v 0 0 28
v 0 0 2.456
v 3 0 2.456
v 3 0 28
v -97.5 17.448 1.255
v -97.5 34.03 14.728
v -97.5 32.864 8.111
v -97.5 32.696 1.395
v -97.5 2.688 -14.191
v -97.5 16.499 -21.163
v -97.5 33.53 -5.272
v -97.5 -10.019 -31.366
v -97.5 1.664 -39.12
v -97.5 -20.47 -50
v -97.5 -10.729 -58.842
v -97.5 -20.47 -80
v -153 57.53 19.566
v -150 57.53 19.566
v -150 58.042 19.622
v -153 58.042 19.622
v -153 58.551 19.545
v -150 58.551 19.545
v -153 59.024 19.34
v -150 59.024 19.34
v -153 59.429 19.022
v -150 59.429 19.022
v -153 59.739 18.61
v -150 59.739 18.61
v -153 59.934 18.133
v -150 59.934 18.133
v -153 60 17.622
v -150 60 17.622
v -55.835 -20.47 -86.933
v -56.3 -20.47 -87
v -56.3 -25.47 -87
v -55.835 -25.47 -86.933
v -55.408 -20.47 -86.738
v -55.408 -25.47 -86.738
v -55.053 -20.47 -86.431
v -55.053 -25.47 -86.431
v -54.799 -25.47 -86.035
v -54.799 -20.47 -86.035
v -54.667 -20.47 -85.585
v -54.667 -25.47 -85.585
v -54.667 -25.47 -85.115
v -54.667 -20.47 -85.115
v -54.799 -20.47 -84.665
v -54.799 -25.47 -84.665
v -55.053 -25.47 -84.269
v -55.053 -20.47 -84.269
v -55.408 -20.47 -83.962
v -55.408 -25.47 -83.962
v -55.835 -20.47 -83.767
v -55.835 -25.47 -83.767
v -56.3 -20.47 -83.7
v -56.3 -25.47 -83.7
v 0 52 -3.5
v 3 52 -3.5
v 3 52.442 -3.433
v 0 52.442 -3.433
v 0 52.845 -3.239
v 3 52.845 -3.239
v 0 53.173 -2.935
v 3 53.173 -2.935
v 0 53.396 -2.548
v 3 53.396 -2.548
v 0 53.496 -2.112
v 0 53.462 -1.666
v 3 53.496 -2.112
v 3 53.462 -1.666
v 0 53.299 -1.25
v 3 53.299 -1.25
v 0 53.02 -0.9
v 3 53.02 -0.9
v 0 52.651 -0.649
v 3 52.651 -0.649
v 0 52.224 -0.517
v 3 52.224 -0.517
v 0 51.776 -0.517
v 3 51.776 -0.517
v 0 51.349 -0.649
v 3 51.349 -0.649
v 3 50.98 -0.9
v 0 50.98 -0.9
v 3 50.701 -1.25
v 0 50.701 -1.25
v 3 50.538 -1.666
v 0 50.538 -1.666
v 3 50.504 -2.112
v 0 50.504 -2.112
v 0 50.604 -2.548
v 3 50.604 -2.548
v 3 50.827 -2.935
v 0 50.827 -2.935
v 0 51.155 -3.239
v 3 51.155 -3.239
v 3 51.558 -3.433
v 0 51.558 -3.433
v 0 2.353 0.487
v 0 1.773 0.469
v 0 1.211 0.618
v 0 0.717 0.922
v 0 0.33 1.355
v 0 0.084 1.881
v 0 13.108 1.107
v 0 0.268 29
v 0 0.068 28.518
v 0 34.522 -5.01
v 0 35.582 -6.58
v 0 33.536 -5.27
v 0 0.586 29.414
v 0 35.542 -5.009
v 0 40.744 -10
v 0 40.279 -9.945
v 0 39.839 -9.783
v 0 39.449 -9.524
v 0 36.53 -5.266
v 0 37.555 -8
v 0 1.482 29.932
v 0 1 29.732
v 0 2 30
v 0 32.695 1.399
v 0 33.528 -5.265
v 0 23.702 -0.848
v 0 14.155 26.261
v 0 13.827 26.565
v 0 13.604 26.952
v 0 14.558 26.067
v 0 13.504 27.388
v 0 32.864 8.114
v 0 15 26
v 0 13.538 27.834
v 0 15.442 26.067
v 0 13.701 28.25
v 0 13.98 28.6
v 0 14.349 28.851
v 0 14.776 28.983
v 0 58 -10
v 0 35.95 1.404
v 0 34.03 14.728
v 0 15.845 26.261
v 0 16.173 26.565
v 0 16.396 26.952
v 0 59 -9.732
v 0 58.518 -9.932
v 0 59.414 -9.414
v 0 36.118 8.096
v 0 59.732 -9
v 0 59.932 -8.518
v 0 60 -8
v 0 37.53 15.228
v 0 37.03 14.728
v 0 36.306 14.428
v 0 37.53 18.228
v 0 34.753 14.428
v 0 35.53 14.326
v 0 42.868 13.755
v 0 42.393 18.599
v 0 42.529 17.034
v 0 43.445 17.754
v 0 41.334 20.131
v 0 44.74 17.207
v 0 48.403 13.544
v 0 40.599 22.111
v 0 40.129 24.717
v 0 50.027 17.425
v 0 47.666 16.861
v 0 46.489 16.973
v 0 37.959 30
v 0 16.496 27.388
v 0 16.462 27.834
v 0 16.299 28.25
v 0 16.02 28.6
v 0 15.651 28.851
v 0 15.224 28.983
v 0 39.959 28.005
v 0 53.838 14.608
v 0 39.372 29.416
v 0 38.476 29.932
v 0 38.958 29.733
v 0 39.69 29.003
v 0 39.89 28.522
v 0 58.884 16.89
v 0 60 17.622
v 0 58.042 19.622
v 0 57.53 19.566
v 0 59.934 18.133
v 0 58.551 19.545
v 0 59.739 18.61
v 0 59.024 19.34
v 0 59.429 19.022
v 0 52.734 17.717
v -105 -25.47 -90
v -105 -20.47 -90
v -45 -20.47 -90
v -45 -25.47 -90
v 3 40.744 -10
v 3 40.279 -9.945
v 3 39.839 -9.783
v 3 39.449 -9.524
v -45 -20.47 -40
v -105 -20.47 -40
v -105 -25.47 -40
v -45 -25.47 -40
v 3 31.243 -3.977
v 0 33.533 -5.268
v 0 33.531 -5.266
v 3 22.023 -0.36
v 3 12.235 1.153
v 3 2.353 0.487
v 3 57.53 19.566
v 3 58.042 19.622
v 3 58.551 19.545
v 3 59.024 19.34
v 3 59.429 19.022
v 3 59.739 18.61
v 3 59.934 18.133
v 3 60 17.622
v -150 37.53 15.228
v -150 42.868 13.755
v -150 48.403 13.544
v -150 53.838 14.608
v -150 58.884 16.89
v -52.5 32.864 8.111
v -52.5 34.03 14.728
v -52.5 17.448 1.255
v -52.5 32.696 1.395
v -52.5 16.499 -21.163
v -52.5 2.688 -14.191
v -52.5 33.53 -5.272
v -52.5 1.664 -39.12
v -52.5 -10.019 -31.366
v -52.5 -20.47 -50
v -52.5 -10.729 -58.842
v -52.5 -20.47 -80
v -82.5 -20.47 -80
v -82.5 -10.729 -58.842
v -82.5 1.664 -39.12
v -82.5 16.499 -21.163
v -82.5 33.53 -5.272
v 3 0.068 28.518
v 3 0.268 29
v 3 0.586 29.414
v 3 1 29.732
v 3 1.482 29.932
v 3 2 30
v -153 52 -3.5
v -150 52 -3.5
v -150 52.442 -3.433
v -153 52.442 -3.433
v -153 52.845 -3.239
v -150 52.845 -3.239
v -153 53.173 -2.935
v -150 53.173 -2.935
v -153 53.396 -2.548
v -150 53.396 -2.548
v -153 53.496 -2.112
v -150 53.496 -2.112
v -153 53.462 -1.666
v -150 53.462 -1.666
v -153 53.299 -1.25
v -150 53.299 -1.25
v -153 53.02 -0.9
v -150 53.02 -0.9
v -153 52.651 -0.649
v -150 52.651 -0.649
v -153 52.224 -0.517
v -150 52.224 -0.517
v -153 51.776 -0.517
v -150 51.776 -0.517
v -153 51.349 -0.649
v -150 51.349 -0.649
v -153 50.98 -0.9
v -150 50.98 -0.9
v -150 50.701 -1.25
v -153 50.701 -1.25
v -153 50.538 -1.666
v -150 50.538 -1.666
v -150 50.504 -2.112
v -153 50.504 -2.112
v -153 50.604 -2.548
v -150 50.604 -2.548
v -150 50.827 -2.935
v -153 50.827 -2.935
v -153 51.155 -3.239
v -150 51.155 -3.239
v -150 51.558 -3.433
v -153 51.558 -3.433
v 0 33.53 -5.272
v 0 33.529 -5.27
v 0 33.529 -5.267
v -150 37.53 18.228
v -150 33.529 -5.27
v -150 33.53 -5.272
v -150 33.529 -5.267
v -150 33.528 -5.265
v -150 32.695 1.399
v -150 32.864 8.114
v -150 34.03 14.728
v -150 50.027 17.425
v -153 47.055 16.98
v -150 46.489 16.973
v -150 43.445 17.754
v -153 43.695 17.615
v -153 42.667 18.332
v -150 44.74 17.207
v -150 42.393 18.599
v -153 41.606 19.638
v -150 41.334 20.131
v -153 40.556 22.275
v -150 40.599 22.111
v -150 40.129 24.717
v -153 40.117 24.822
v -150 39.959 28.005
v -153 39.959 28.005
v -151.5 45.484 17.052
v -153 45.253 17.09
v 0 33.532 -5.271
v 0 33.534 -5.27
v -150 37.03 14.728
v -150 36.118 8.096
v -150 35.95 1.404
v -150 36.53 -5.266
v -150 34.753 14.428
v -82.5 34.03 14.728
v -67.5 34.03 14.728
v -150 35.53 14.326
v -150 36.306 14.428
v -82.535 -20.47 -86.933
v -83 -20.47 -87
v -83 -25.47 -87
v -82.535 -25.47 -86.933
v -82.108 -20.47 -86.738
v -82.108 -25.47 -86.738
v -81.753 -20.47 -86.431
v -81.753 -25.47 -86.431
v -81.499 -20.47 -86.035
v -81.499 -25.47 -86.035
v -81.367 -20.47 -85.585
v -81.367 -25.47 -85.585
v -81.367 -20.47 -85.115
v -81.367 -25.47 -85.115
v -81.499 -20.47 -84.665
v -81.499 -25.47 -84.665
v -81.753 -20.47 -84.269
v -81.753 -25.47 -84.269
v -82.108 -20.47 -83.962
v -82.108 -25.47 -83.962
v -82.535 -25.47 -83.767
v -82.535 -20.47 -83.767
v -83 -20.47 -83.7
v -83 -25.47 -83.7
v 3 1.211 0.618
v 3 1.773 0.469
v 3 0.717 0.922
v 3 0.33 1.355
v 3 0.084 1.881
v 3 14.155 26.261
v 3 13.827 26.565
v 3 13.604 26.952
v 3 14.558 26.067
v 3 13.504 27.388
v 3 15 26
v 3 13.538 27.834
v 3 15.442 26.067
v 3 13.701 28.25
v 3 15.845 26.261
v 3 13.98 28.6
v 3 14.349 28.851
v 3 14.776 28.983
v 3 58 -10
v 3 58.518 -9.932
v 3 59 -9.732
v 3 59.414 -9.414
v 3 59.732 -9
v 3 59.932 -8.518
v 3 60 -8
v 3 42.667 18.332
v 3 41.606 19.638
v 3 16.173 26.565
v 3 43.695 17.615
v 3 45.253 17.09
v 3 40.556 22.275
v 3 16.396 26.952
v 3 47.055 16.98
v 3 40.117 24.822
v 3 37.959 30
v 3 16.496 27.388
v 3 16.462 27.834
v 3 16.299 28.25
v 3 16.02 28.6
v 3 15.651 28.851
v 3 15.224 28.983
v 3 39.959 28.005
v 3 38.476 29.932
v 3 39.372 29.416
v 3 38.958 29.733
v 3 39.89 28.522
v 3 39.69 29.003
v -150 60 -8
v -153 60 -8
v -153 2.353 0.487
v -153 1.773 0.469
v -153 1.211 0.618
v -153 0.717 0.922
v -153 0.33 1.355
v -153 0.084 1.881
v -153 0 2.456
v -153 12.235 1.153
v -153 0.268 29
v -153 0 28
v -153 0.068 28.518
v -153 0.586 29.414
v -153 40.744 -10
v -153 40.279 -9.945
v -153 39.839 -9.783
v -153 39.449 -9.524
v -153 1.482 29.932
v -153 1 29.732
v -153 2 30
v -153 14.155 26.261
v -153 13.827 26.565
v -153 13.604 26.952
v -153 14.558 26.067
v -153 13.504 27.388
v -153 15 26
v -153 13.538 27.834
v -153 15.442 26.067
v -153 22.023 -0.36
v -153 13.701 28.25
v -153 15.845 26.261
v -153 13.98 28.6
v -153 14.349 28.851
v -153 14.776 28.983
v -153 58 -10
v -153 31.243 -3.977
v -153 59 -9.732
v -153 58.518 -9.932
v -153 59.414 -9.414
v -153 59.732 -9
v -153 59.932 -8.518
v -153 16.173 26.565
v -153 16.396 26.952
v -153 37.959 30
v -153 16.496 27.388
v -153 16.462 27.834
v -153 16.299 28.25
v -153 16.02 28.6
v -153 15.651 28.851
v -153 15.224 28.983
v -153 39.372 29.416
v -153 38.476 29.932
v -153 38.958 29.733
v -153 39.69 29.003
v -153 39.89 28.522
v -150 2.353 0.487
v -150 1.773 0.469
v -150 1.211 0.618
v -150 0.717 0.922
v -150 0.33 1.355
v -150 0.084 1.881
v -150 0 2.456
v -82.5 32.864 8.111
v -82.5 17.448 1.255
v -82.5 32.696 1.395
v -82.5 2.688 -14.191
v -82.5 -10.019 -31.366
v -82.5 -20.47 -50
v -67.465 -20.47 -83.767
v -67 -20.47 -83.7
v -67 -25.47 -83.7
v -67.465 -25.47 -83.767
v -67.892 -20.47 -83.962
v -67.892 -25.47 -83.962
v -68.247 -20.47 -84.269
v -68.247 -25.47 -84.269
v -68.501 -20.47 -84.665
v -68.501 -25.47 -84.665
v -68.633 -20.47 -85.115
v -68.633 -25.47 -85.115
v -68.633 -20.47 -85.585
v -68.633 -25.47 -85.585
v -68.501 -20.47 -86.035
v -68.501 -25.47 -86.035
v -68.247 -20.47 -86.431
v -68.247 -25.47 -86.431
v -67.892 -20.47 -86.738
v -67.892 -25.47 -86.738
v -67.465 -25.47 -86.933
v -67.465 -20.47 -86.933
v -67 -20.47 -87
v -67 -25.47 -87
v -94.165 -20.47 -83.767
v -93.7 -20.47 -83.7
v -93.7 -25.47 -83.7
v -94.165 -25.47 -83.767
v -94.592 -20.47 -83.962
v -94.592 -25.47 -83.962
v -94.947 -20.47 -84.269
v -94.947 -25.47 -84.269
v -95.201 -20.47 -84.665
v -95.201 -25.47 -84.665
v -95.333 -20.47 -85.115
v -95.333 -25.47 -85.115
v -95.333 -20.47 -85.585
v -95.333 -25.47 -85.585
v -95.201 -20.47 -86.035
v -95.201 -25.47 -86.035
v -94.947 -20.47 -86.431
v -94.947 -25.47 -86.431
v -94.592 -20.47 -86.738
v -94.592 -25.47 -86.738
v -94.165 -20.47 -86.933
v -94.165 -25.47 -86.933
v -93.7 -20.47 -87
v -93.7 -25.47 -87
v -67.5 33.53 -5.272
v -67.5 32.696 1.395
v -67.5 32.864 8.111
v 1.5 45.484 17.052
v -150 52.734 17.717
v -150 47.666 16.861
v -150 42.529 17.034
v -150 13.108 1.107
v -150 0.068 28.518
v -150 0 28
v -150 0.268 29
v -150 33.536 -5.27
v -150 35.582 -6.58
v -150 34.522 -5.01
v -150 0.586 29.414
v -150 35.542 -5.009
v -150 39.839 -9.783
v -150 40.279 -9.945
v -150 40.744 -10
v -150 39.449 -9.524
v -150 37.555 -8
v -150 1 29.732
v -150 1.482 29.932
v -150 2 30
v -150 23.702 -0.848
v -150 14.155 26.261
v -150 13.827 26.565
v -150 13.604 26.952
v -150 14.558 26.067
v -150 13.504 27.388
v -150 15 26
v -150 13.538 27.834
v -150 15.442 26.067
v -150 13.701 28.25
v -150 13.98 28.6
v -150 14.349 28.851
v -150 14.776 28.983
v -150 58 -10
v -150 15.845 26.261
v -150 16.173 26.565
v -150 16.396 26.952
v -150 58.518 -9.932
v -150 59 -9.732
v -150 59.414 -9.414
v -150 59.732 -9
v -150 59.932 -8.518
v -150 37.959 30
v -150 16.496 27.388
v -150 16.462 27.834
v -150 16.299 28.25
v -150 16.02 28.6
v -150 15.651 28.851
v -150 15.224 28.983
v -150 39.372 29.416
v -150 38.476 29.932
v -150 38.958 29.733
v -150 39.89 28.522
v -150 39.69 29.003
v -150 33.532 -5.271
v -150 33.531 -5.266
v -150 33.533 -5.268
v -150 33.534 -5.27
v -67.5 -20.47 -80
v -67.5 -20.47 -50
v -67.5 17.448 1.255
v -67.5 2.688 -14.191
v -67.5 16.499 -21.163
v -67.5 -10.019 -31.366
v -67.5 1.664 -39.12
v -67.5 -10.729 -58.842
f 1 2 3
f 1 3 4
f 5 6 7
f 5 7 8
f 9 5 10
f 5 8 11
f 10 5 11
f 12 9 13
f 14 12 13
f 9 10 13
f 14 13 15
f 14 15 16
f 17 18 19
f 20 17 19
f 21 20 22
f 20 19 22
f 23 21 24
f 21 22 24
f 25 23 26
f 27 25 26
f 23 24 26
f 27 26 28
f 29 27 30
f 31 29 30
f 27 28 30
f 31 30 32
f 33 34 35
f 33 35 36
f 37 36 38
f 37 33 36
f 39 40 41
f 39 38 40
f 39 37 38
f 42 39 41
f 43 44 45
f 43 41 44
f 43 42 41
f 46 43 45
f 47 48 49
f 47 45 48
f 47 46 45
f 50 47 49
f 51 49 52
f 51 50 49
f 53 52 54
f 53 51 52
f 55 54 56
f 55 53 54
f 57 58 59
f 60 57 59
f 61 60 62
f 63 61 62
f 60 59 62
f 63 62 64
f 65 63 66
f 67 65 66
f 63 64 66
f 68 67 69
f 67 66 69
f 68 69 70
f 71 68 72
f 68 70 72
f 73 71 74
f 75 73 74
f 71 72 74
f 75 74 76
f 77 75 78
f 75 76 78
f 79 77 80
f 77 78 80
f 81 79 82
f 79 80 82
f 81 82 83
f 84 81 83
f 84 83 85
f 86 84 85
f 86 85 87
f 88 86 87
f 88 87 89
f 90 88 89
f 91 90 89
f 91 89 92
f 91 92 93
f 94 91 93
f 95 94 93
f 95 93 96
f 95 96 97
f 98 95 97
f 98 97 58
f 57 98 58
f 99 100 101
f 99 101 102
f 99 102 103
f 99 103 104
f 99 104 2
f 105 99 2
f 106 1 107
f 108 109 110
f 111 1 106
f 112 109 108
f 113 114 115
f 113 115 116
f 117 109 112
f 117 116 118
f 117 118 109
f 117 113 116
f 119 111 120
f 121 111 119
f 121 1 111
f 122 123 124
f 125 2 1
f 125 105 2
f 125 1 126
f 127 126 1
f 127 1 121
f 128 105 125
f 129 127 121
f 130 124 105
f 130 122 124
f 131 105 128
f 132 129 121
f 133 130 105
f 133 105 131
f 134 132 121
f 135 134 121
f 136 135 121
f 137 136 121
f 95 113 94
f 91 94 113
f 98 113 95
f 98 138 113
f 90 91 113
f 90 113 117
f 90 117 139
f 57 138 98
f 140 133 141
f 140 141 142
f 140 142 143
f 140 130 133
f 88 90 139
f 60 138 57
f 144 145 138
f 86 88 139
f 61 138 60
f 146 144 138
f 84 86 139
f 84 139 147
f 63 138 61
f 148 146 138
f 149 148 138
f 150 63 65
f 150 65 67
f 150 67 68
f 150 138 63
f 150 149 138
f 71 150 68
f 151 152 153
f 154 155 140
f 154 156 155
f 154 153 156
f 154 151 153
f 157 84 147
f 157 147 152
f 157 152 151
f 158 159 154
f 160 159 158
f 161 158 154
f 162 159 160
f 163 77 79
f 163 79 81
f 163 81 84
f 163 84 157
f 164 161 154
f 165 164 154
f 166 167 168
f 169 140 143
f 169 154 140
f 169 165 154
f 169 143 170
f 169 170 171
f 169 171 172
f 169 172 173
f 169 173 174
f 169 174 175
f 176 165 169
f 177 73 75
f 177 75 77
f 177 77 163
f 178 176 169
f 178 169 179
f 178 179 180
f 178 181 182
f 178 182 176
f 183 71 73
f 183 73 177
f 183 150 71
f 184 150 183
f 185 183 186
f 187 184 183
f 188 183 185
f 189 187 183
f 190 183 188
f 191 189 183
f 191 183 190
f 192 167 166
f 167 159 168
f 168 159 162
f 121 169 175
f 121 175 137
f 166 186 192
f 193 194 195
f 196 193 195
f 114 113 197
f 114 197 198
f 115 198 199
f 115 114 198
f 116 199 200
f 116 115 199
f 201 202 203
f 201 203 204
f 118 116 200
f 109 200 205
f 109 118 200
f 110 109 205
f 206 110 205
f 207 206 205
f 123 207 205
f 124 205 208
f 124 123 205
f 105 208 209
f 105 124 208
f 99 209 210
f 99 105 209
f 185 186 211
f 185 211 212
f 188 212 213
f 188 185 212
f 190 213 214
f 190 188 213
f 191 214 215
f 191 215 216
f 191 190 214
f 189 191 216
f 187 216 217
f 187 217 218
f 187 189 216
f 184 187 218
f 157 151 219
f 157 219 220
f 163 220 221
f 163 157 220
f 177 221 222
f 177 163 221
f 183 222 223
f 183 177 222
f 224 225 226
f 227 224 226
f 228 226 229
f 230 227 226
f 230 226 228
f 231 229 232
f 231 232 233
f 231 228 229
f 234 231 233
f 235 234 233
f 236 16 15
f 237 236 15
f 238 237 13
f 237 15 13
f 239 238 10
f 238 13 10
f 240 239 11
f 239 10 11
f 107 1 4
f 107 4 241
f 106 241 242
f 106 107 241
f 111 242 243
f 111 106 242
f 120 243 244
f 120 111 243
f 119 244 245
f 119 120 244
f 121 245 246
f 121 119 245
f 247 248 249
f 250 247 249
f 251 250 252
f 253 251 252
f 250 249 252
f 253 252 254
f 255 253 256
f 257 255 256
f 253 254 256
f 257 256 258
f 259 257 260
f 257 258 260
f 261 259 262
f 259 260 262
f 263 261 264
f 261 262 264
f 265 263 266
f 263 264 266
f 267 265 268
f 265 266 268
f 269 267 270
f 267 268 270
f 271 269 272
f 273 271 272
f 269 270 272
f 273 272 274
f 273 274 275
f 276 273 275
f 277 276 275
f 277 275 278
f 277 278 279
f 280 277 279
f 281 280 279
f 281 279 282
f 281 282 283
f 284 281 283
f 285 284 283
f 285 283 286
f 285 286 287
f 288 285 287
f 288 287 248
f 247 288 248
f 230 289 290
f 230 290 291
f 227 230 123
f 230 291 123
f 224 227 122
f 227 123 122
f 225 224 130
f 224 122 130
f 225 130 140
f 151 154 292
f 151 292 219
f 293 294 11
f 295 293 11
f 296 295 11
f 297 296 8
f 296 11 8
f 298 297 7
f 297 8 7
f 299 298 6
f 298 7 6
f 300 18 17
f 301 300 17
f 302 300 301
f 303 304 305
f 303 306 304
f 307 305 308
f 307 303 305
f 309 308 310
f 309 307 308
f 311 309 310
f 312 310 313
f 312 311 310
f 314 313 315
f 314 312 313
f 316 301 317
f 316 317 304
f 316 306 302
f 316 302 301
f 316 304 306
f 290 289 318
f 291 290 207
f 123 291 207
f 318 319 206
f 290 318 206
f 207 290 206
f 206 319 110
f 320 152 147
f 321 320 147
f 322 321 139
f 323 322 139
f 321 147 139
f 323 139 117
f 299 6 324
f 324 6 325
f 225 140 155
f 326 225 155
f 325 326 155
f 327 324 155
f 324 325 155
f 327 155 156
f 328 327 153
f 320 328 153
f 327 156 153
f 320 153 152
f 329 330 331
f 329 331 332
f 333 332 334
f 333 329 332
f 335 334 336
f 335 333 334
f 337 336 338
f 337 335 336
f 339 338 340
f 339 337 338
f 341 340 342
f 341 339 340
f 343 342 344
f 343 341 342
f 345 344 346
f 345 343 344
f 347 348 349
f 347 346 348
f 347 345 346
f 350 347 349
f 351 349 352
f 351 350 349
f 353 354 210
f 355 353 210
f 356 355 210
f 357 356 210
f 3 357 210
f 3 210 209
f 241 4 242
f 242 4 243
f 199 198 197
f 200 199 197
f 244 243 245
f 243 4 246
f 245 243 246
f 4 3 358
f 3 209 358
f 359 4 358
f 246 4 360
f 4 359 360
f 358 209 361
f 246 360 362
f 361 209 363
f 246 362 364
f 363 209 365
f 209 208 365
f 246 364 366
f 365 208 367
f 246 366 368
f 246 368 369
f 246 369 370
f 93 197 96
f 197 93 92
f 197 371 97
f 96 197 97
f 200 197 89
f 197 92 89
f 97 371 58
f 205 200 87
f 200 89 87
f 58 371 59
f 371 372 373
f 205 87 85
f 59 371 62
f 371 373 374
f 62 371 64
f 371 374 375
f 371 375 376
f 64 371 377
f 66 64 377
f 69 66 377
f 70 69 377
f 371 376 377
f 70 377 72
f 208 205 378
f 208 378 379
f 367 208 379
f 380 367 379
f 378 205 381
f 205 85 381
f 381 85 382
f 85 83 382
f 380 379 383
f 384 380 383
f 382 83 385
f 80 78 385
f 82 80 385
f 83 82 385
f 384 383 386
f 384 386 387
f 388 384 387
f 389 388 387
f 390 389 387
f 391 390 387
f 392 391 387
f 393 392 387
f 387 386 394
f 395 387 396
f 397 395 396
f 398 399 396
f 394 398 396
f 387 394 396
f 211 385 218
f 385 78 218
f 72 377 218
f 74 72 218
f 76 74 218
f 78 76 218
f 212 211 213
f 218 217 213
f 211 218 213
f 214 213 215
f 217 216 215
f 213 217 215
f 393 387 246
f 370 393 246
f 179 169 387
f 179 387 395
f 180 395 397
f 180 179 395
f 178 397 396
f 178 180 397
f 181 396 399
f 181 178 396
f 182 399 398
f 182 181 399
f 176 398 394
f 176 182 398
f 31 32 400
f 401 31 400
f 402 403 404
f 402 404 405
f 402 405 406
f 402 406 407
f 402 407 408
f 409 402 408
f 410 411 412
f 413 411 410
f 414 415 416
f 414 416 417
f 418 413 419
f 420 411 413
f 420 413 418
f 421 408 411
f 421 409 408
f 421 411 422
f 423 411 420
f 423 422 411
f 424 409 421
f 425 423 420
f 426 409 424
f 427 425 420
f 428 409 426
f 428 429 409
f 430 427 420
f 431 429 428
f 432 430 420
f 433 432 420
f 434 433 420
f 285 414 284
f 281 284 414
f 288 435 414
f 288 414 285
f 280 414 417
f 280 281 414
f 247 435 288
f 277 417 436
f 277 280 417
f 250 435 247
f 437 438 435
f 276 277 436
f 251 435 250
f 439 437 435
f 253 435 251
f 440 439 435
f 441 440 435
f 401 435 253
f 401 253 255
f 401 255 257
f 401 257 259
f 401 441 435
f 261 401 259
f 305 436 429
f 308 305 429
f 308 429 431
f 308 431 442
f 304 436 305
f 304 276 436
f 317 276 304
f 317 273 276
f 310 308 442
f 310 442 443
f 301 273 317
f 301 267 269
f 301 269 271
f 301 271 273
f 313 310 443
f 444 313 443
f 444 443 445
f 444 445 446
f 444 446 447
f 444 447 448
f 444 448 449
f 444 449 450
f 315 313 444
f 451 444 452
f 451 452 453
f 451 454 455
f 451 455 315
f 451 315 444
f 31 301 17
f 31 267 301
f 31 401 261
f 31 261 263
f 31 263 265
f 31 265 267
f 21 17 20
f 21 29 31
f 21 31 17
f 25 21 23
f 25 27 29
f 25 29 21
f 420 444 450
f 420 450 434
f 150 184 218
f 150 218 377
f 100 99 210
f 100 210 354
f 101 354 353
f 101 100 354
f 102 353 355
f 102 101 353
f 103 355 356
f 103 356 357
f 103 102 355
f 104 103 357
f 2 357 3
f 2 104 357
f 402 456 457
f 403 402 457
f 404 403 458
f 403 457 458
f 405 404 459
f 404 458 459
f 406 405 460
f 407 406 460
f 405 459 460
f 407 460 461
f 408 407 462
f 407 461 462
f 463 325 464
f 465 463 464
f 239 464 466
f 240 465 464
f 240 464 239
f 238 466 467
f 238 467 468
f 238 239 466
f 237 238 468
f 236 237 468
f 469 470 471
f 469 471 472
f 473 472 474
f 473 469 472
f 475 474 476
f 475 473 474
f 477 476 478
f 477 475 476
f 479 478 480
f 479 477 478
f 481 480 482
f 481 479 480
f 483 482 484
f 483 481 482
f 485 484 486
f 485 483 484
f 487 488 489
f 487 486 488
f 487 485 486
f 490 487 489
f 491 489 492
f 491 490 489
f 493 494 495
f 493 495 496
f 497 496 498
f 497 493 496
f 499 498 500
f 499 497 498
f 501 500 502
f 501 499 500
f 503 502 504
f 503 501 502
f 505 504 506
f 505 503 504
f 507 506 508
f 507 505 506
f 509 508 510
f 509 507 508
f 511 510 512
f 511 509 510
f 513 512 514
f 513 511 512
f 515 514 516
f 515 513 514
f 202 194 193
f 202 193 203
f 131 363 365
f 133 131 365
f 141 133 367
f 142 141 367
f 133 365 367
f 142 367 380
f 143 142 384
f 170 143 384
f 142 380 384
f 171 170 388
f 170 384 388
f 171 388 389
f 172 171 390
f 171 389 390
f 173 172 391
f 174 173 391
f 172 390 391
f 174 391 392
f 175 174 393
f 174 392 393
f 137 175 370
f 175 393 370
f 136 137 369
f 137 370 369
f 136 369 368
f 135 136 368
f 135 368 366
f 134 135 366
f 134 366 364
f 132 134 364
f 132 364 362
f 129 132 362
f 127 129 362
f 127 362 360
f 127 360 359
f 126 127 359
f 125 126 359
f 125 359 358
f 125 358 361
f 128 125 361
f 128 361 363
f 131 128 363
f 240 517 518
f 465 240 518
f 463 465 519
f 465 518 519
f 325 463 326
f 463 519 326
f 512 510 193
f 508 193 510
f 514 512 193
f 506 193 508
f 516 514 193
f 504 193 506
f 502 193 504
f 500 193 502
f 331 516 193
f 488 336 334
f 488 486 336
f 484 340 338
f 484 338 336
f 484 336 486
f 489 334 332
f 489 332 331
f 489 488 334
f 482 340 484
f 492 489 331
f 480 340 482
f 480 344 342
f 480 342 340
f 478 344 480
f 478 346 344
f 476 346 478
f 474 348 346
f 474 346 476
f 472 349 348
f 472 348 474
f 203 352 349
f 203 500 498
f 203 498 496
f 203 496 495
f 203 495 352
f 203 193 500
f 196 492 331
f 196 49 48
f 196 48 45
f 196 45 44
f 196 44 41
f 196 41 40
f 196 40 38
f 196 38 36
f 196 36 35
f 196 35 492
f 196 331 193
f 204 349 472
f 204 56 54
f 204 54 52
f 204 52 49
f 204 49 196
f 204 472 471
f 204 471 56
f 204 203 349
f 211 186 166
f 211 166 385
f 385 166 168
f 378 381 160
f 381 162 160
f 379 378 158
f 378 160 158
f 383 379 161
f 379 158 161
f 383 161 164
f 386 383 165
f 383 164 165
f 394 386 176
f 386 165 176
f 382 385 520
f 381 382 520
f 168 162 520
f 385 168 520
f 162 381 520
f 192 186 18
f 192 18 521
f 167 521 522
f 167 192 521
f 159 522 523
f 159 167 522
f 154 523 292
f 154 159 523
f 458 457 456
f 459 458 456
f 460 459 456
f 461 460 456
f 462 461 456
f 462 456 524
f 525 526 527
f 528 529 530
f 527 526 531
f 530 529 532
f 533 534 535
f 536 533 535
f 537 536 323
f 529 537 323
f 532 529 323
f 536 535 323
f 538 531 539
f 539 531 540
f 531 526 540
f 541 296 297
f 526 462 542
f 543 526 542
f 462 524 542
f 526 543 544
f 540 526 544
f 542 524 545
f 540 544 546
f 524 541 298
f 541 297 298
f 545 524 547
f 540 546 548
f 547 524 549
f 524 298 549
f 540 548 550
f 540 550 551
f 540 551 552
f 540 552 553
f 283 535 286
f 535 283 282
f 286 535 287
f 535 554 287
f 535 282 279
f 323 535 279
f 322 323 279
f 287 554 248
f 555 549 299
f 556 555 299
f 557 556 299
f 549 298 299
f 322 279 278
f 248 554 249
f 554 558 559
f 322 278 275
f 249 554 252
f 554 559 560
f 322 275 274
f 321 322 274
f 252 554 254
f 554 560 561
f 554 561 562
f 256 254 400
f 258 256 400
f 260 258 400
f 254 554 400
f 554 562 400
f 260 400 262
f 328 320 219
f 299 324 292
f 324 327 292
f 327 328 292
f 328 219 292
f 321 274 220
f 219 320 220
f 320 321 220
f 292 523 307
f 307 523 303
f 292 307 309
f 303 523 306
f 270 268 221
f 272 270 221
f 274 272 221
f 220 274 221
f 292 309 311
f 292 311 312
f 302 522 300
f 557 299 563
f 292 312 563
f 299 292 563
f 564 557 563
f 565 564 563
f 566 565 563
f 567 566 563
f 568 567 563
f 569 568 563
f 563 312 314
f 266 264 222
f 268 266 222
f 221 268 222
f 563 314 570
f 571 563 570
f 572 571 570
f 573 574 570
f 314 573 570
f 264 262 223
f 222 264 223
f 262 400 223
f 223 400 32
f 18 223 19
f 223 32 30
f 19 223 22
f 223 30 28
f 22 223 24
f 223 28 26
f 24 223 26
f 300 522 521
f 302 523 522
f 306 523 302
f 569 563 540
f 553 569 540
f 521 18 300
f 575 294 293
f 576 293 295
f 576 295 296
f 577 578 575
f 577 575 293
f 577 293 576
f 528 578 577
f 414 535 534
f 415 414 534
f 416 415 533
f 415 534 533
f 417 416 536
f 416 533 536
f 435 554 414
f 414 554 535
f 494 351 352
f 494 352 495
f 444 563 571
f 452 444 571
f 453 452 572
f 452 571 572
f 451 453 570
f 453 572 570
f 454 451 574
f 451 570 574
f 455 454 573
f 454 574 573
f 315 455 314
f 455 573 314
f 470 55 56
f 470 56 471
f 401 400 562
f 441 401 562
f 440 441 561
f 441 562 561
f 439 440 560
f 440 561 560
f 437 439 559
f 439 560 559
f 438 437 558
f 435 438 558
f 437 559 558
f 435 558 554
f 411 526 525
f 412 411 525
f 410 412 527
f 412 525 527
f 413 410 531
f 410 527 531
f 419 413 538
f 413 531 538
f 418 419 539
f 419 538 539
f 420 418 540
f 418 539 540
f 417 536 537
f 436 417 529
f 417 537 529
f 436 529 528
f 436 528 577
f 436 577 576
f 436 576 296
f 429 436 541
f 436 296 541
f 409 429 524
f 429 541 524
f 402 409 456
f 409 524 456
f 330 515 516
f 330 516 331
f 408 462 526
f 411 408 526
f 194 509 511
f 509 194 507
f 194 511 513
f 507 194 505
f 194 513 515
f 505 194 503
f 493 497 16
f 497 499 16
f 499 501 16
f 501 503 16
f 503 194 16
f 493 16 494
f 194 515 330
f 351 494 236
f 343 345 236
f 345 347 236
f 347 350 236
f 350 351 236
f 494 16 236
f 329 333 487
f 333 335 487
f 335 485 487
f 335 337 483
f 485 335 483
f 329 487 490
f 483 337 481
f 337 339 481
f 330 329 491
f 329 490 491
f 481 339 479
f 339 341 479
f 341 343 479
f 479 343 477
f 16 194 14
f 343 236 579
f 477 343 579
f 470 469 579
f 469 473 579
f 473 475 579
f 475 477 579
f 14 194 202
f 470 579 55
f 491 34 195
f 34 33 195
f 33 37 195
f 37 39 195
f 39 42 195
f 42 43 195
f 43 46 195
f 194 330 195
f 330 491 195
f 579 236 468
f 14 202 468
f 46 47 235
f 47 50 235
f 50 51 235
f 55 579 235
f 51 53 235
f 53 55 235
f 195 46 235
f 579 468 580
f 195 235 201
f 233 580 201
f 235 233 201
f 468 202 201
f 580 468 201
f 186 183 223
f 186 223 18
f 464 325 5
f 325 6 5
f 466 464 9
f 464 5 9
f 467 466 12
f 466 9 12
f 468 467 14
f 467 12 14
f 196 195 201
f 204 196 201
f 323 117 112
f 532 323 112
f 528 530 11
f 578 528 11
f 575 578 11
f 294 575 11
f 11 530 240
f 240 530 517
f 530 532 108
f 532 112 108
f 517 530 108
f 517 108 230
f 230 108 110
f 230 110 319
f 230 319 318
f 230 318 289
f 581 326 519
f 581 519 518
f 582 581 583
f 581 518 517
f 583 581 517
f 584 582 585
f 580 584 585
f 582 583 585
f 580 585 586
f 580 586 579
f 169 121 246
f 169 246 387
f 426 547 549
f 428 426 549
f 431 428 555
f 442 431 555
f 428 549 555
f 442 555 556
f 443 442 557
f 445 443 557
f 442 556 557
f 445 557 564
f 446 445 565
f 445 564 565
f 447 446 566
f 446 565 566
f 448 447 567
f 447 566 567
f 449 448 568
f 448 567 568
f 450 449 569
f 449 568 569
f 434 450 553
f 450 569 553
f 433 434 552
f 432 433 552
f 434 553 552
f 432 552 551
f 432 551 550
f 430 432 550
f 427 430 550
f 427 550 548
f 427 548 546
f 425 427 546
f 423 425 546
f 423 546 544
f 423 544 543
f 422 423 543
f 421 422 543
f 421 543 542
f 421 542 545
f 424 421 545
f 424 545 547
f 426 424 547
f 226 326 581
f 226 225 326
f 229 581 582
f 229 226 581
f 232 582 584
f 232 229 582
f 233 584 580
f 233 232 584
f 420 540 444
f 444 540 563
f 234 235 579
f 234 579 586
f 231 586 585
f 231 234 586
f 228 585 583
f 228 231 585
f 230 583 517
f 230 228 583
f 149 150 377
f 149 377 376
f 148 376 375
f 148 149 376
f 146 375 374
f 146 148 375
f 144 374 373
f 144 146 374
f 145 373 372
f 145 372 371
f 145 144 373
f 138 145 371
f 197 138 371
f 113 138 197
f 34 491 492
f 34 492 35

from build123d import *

# Parameters (mm, degrees)
BOSS_EXTRUDE3_DEPTH  = 3
BOSS_EXTRUDE4_DEPTH  = 150
BOSS_EXTRUDE7_DEPTH  = 150
BOSS_EXTRUDE11_DEPTH = 7.5
SKETCH10_W           = 60
SKETCH10_H           = 50
BOSS_EXTRUDE12_DEPTH = 5
CUT_EXTRUDE1_DEPTH   = 195.89610275
SKETCH12_R           = 1.5
CUT_EXTRUDE2_DEPTH   = 190.831504348


with BuildPart() as part:
    # Sketch2 → Boss-Extrude3 (new body)
    with BuildSketch(Plane(origin=(0, 0, 0), x_dir=(0, 0, -1), z_dir=(1, 0, 0))):
        with BuildLine():
            Line((-2.455878577, 0), (-28, 0))
            ThreePointArc((-28, 0), (-29.414213562, 0.585786438), (-30, 2))
            Line((-30, 2), (-30, 37.959376251))
            ThreePointArc((-30, 37.959376251), (-29.415933658, 39.371867622), (-28.004868125, 39.959370326))
            add(Edge.make_bspline(
                [(-19.566381264, 57.529565551), (-18.600890686, 53.540054818), (-14.629736922, 44.732493893), (-20.209073936, 39.978345831), (-28.004868125, 39.959370326)],
                knots=[0.096883264, 0.096883264, 0.096883264, 0.096883264, 0.548441632, 0.966186264, 0.966186264, 0.966186264, 0.966186264], degree=3))
            ThreePointArc((-19.566381264, 57.529565551), (-19.194257187, 59.23675606), (-17.622495612, 60))
            Line((-17.622495612, 60), (8, 60))
            ThreePointArc((8, 60), (9.414213562, 59.414213562), (10, 58))
            Line((10, 58), (10, 40.744458909))
            ThreePointArc((10, 40.744458909), (9.87713793, 40.054275462), (9.523646809, 39.448889381))
            ThreePointArc((9.523646809, 39.448889381), (0.359945302, 22.023181527), (-0.487300765, 2.353130851))
            ThreePointArc((-0.487300765, 2.353130851), (-0.921886774, 0.716696003), (-2.455878577, 0))
        make_face()
    boss_extrude3 = extrude(amount=BOSS_EXTRUDE3_DEPTH)

    # Sketch3 → Boss-Extrude4 (add)
    with BuildSketch(Plane.ZY):
        with BuildLine():
            Line((18.228025457, 37.529565551), (15.228025457, 37.529565551))
            ThreePointArc((15.228025457, 37.529565551), (13.544434891, 48.402566635), (16.889669649, 58.8842666))
            Line((16.889669649, 58.8842666), (19.566381264, 57.529565551))
            ThreePointArc((19.566381264, 57.529565551), (16.861238321, 47.665807833), (18.228025457, 37.529565551))
        make_face()
    extrude(amount=BOSS_EXTRUDE4_DEPTH)

    # Sketch6 → Boss-Extrude7 (add)
    with BuildSketch(Plane.ZY):
        with BuildLine():
            ThreePointArc((14.728025457, 37.029565551), (4.752130999, 35.940625674), (-5.265723566, 36.529565551))
            ThreePointArc((-5.265723566, 36.529565551), (-4.976948932, 35.028960586), (-5.271974543, 33.529572064))
            ThreePointArc((-5.271974543, 33.529572064), (4.756163556, 32.65403017), (14.728025457, 34.029565551))
            ThreePointArc((14.728025457, 34.029565551), (14.326101668, 35.529565551), (14.728025457, 37.029565551))
        make_face()
    extrude(amount=BOSS_EXTRUDE7_DEPTH)

    # Mirror2: Boss-Extrude3 across plane
    add(boss_extrude3.mirror(Plane.ZY.offset(75)))

    # Sketch9 → Boss-Extrude11 (add, symmetric)
    with BuildSketch(Plane(origin=(-60, 0, 0), x_dir=(0, 0, -1), z_dir=(1, 0, 0))):
        with BuildLine():
            Line((50, -20.470434449), (80, -20.470434449))
            ThreePointArc((80, -20.470434449), (39.119970751, 1.663921764), (5.271974543, 33.529572064))
            ThreePointArc((5.271974543, 33.529572064), (-4.756163556, 32.65403017), (-14.728025457, 34.029565551))
            ThreePointArc((-14.728025457, 34.029565551), (14.190904343, 2.687943249), (50, -20.470434449))
        make_face()
    boss_extrude11 = extrude(amount=BOSS_EXTRUDE11_DEPTH, both=True)

    # Mirror3: Boss-Extrude11 across plane
    add(boss_extrude11.mirror(Plane.ZY.offset(75)))

    # Sketch10 → Boss-Extrude12 (add)
    with BuildSketch(Plane.XZ.offset(20.470434449)):
        with Locations((-75, -65)):
            Rectangle(SKETCH10_W, SKETCH10_H)
    extrude(amount=BOSS_EXTRUDE12_DEPTH)

    # Sketch11 → Cut-Extrude1 (cut, through all)
    with BuildSketch(Plane(origin=(0, -20.470434449, 0), x_dir=(1, 0, 0), z_dir=(0, 1, 0))):
        with BuildLine():
            Line((-93.7, 87), (-83, 87))
            ThreePointArc((-83, 87), (-81.35, 85.35), (-83, 83.7))
            Line((-83, 83.7), (-93.7, 83.7))
            ThreePointArc((-93.7, 83.7), (-95.35, 85.35), (-93.7, 87))
        make_face()
        with BuildLine():
            Line((-67, 87), (-56.3, 87))
            ThreePointArc((-56.3, 87), (-54.65, 85.35), (-56.3, 83.7))
            Line((-56.3, 83.7), (-67, 83.7))
            ThreePointArc((-67, 83.7), (-68.65, 85.35), (-67, 87))
        make_face()
    extrude(amount=-CUT_EXTRUDE1_DEPTH, mode=Mode.SUBTRACT)

    # Sketch12 → Cut-Extrude2 (cut, through all)
    with BuildSketch(Plane(origin=(3, 0, 0), x_dir=(0, 0, -1), z_dir=(1, 0, 0))):
        with Locations((2, 52)):
            Circle(SKETCH12_R)
        with Locations((-27.5, 15)):
            Circle(SKETCH12_R)
    extrude(amount=-CUT_EXTRUDE2_DEPTH, mode=Mode.SUBTRACT)


solid = part.part
